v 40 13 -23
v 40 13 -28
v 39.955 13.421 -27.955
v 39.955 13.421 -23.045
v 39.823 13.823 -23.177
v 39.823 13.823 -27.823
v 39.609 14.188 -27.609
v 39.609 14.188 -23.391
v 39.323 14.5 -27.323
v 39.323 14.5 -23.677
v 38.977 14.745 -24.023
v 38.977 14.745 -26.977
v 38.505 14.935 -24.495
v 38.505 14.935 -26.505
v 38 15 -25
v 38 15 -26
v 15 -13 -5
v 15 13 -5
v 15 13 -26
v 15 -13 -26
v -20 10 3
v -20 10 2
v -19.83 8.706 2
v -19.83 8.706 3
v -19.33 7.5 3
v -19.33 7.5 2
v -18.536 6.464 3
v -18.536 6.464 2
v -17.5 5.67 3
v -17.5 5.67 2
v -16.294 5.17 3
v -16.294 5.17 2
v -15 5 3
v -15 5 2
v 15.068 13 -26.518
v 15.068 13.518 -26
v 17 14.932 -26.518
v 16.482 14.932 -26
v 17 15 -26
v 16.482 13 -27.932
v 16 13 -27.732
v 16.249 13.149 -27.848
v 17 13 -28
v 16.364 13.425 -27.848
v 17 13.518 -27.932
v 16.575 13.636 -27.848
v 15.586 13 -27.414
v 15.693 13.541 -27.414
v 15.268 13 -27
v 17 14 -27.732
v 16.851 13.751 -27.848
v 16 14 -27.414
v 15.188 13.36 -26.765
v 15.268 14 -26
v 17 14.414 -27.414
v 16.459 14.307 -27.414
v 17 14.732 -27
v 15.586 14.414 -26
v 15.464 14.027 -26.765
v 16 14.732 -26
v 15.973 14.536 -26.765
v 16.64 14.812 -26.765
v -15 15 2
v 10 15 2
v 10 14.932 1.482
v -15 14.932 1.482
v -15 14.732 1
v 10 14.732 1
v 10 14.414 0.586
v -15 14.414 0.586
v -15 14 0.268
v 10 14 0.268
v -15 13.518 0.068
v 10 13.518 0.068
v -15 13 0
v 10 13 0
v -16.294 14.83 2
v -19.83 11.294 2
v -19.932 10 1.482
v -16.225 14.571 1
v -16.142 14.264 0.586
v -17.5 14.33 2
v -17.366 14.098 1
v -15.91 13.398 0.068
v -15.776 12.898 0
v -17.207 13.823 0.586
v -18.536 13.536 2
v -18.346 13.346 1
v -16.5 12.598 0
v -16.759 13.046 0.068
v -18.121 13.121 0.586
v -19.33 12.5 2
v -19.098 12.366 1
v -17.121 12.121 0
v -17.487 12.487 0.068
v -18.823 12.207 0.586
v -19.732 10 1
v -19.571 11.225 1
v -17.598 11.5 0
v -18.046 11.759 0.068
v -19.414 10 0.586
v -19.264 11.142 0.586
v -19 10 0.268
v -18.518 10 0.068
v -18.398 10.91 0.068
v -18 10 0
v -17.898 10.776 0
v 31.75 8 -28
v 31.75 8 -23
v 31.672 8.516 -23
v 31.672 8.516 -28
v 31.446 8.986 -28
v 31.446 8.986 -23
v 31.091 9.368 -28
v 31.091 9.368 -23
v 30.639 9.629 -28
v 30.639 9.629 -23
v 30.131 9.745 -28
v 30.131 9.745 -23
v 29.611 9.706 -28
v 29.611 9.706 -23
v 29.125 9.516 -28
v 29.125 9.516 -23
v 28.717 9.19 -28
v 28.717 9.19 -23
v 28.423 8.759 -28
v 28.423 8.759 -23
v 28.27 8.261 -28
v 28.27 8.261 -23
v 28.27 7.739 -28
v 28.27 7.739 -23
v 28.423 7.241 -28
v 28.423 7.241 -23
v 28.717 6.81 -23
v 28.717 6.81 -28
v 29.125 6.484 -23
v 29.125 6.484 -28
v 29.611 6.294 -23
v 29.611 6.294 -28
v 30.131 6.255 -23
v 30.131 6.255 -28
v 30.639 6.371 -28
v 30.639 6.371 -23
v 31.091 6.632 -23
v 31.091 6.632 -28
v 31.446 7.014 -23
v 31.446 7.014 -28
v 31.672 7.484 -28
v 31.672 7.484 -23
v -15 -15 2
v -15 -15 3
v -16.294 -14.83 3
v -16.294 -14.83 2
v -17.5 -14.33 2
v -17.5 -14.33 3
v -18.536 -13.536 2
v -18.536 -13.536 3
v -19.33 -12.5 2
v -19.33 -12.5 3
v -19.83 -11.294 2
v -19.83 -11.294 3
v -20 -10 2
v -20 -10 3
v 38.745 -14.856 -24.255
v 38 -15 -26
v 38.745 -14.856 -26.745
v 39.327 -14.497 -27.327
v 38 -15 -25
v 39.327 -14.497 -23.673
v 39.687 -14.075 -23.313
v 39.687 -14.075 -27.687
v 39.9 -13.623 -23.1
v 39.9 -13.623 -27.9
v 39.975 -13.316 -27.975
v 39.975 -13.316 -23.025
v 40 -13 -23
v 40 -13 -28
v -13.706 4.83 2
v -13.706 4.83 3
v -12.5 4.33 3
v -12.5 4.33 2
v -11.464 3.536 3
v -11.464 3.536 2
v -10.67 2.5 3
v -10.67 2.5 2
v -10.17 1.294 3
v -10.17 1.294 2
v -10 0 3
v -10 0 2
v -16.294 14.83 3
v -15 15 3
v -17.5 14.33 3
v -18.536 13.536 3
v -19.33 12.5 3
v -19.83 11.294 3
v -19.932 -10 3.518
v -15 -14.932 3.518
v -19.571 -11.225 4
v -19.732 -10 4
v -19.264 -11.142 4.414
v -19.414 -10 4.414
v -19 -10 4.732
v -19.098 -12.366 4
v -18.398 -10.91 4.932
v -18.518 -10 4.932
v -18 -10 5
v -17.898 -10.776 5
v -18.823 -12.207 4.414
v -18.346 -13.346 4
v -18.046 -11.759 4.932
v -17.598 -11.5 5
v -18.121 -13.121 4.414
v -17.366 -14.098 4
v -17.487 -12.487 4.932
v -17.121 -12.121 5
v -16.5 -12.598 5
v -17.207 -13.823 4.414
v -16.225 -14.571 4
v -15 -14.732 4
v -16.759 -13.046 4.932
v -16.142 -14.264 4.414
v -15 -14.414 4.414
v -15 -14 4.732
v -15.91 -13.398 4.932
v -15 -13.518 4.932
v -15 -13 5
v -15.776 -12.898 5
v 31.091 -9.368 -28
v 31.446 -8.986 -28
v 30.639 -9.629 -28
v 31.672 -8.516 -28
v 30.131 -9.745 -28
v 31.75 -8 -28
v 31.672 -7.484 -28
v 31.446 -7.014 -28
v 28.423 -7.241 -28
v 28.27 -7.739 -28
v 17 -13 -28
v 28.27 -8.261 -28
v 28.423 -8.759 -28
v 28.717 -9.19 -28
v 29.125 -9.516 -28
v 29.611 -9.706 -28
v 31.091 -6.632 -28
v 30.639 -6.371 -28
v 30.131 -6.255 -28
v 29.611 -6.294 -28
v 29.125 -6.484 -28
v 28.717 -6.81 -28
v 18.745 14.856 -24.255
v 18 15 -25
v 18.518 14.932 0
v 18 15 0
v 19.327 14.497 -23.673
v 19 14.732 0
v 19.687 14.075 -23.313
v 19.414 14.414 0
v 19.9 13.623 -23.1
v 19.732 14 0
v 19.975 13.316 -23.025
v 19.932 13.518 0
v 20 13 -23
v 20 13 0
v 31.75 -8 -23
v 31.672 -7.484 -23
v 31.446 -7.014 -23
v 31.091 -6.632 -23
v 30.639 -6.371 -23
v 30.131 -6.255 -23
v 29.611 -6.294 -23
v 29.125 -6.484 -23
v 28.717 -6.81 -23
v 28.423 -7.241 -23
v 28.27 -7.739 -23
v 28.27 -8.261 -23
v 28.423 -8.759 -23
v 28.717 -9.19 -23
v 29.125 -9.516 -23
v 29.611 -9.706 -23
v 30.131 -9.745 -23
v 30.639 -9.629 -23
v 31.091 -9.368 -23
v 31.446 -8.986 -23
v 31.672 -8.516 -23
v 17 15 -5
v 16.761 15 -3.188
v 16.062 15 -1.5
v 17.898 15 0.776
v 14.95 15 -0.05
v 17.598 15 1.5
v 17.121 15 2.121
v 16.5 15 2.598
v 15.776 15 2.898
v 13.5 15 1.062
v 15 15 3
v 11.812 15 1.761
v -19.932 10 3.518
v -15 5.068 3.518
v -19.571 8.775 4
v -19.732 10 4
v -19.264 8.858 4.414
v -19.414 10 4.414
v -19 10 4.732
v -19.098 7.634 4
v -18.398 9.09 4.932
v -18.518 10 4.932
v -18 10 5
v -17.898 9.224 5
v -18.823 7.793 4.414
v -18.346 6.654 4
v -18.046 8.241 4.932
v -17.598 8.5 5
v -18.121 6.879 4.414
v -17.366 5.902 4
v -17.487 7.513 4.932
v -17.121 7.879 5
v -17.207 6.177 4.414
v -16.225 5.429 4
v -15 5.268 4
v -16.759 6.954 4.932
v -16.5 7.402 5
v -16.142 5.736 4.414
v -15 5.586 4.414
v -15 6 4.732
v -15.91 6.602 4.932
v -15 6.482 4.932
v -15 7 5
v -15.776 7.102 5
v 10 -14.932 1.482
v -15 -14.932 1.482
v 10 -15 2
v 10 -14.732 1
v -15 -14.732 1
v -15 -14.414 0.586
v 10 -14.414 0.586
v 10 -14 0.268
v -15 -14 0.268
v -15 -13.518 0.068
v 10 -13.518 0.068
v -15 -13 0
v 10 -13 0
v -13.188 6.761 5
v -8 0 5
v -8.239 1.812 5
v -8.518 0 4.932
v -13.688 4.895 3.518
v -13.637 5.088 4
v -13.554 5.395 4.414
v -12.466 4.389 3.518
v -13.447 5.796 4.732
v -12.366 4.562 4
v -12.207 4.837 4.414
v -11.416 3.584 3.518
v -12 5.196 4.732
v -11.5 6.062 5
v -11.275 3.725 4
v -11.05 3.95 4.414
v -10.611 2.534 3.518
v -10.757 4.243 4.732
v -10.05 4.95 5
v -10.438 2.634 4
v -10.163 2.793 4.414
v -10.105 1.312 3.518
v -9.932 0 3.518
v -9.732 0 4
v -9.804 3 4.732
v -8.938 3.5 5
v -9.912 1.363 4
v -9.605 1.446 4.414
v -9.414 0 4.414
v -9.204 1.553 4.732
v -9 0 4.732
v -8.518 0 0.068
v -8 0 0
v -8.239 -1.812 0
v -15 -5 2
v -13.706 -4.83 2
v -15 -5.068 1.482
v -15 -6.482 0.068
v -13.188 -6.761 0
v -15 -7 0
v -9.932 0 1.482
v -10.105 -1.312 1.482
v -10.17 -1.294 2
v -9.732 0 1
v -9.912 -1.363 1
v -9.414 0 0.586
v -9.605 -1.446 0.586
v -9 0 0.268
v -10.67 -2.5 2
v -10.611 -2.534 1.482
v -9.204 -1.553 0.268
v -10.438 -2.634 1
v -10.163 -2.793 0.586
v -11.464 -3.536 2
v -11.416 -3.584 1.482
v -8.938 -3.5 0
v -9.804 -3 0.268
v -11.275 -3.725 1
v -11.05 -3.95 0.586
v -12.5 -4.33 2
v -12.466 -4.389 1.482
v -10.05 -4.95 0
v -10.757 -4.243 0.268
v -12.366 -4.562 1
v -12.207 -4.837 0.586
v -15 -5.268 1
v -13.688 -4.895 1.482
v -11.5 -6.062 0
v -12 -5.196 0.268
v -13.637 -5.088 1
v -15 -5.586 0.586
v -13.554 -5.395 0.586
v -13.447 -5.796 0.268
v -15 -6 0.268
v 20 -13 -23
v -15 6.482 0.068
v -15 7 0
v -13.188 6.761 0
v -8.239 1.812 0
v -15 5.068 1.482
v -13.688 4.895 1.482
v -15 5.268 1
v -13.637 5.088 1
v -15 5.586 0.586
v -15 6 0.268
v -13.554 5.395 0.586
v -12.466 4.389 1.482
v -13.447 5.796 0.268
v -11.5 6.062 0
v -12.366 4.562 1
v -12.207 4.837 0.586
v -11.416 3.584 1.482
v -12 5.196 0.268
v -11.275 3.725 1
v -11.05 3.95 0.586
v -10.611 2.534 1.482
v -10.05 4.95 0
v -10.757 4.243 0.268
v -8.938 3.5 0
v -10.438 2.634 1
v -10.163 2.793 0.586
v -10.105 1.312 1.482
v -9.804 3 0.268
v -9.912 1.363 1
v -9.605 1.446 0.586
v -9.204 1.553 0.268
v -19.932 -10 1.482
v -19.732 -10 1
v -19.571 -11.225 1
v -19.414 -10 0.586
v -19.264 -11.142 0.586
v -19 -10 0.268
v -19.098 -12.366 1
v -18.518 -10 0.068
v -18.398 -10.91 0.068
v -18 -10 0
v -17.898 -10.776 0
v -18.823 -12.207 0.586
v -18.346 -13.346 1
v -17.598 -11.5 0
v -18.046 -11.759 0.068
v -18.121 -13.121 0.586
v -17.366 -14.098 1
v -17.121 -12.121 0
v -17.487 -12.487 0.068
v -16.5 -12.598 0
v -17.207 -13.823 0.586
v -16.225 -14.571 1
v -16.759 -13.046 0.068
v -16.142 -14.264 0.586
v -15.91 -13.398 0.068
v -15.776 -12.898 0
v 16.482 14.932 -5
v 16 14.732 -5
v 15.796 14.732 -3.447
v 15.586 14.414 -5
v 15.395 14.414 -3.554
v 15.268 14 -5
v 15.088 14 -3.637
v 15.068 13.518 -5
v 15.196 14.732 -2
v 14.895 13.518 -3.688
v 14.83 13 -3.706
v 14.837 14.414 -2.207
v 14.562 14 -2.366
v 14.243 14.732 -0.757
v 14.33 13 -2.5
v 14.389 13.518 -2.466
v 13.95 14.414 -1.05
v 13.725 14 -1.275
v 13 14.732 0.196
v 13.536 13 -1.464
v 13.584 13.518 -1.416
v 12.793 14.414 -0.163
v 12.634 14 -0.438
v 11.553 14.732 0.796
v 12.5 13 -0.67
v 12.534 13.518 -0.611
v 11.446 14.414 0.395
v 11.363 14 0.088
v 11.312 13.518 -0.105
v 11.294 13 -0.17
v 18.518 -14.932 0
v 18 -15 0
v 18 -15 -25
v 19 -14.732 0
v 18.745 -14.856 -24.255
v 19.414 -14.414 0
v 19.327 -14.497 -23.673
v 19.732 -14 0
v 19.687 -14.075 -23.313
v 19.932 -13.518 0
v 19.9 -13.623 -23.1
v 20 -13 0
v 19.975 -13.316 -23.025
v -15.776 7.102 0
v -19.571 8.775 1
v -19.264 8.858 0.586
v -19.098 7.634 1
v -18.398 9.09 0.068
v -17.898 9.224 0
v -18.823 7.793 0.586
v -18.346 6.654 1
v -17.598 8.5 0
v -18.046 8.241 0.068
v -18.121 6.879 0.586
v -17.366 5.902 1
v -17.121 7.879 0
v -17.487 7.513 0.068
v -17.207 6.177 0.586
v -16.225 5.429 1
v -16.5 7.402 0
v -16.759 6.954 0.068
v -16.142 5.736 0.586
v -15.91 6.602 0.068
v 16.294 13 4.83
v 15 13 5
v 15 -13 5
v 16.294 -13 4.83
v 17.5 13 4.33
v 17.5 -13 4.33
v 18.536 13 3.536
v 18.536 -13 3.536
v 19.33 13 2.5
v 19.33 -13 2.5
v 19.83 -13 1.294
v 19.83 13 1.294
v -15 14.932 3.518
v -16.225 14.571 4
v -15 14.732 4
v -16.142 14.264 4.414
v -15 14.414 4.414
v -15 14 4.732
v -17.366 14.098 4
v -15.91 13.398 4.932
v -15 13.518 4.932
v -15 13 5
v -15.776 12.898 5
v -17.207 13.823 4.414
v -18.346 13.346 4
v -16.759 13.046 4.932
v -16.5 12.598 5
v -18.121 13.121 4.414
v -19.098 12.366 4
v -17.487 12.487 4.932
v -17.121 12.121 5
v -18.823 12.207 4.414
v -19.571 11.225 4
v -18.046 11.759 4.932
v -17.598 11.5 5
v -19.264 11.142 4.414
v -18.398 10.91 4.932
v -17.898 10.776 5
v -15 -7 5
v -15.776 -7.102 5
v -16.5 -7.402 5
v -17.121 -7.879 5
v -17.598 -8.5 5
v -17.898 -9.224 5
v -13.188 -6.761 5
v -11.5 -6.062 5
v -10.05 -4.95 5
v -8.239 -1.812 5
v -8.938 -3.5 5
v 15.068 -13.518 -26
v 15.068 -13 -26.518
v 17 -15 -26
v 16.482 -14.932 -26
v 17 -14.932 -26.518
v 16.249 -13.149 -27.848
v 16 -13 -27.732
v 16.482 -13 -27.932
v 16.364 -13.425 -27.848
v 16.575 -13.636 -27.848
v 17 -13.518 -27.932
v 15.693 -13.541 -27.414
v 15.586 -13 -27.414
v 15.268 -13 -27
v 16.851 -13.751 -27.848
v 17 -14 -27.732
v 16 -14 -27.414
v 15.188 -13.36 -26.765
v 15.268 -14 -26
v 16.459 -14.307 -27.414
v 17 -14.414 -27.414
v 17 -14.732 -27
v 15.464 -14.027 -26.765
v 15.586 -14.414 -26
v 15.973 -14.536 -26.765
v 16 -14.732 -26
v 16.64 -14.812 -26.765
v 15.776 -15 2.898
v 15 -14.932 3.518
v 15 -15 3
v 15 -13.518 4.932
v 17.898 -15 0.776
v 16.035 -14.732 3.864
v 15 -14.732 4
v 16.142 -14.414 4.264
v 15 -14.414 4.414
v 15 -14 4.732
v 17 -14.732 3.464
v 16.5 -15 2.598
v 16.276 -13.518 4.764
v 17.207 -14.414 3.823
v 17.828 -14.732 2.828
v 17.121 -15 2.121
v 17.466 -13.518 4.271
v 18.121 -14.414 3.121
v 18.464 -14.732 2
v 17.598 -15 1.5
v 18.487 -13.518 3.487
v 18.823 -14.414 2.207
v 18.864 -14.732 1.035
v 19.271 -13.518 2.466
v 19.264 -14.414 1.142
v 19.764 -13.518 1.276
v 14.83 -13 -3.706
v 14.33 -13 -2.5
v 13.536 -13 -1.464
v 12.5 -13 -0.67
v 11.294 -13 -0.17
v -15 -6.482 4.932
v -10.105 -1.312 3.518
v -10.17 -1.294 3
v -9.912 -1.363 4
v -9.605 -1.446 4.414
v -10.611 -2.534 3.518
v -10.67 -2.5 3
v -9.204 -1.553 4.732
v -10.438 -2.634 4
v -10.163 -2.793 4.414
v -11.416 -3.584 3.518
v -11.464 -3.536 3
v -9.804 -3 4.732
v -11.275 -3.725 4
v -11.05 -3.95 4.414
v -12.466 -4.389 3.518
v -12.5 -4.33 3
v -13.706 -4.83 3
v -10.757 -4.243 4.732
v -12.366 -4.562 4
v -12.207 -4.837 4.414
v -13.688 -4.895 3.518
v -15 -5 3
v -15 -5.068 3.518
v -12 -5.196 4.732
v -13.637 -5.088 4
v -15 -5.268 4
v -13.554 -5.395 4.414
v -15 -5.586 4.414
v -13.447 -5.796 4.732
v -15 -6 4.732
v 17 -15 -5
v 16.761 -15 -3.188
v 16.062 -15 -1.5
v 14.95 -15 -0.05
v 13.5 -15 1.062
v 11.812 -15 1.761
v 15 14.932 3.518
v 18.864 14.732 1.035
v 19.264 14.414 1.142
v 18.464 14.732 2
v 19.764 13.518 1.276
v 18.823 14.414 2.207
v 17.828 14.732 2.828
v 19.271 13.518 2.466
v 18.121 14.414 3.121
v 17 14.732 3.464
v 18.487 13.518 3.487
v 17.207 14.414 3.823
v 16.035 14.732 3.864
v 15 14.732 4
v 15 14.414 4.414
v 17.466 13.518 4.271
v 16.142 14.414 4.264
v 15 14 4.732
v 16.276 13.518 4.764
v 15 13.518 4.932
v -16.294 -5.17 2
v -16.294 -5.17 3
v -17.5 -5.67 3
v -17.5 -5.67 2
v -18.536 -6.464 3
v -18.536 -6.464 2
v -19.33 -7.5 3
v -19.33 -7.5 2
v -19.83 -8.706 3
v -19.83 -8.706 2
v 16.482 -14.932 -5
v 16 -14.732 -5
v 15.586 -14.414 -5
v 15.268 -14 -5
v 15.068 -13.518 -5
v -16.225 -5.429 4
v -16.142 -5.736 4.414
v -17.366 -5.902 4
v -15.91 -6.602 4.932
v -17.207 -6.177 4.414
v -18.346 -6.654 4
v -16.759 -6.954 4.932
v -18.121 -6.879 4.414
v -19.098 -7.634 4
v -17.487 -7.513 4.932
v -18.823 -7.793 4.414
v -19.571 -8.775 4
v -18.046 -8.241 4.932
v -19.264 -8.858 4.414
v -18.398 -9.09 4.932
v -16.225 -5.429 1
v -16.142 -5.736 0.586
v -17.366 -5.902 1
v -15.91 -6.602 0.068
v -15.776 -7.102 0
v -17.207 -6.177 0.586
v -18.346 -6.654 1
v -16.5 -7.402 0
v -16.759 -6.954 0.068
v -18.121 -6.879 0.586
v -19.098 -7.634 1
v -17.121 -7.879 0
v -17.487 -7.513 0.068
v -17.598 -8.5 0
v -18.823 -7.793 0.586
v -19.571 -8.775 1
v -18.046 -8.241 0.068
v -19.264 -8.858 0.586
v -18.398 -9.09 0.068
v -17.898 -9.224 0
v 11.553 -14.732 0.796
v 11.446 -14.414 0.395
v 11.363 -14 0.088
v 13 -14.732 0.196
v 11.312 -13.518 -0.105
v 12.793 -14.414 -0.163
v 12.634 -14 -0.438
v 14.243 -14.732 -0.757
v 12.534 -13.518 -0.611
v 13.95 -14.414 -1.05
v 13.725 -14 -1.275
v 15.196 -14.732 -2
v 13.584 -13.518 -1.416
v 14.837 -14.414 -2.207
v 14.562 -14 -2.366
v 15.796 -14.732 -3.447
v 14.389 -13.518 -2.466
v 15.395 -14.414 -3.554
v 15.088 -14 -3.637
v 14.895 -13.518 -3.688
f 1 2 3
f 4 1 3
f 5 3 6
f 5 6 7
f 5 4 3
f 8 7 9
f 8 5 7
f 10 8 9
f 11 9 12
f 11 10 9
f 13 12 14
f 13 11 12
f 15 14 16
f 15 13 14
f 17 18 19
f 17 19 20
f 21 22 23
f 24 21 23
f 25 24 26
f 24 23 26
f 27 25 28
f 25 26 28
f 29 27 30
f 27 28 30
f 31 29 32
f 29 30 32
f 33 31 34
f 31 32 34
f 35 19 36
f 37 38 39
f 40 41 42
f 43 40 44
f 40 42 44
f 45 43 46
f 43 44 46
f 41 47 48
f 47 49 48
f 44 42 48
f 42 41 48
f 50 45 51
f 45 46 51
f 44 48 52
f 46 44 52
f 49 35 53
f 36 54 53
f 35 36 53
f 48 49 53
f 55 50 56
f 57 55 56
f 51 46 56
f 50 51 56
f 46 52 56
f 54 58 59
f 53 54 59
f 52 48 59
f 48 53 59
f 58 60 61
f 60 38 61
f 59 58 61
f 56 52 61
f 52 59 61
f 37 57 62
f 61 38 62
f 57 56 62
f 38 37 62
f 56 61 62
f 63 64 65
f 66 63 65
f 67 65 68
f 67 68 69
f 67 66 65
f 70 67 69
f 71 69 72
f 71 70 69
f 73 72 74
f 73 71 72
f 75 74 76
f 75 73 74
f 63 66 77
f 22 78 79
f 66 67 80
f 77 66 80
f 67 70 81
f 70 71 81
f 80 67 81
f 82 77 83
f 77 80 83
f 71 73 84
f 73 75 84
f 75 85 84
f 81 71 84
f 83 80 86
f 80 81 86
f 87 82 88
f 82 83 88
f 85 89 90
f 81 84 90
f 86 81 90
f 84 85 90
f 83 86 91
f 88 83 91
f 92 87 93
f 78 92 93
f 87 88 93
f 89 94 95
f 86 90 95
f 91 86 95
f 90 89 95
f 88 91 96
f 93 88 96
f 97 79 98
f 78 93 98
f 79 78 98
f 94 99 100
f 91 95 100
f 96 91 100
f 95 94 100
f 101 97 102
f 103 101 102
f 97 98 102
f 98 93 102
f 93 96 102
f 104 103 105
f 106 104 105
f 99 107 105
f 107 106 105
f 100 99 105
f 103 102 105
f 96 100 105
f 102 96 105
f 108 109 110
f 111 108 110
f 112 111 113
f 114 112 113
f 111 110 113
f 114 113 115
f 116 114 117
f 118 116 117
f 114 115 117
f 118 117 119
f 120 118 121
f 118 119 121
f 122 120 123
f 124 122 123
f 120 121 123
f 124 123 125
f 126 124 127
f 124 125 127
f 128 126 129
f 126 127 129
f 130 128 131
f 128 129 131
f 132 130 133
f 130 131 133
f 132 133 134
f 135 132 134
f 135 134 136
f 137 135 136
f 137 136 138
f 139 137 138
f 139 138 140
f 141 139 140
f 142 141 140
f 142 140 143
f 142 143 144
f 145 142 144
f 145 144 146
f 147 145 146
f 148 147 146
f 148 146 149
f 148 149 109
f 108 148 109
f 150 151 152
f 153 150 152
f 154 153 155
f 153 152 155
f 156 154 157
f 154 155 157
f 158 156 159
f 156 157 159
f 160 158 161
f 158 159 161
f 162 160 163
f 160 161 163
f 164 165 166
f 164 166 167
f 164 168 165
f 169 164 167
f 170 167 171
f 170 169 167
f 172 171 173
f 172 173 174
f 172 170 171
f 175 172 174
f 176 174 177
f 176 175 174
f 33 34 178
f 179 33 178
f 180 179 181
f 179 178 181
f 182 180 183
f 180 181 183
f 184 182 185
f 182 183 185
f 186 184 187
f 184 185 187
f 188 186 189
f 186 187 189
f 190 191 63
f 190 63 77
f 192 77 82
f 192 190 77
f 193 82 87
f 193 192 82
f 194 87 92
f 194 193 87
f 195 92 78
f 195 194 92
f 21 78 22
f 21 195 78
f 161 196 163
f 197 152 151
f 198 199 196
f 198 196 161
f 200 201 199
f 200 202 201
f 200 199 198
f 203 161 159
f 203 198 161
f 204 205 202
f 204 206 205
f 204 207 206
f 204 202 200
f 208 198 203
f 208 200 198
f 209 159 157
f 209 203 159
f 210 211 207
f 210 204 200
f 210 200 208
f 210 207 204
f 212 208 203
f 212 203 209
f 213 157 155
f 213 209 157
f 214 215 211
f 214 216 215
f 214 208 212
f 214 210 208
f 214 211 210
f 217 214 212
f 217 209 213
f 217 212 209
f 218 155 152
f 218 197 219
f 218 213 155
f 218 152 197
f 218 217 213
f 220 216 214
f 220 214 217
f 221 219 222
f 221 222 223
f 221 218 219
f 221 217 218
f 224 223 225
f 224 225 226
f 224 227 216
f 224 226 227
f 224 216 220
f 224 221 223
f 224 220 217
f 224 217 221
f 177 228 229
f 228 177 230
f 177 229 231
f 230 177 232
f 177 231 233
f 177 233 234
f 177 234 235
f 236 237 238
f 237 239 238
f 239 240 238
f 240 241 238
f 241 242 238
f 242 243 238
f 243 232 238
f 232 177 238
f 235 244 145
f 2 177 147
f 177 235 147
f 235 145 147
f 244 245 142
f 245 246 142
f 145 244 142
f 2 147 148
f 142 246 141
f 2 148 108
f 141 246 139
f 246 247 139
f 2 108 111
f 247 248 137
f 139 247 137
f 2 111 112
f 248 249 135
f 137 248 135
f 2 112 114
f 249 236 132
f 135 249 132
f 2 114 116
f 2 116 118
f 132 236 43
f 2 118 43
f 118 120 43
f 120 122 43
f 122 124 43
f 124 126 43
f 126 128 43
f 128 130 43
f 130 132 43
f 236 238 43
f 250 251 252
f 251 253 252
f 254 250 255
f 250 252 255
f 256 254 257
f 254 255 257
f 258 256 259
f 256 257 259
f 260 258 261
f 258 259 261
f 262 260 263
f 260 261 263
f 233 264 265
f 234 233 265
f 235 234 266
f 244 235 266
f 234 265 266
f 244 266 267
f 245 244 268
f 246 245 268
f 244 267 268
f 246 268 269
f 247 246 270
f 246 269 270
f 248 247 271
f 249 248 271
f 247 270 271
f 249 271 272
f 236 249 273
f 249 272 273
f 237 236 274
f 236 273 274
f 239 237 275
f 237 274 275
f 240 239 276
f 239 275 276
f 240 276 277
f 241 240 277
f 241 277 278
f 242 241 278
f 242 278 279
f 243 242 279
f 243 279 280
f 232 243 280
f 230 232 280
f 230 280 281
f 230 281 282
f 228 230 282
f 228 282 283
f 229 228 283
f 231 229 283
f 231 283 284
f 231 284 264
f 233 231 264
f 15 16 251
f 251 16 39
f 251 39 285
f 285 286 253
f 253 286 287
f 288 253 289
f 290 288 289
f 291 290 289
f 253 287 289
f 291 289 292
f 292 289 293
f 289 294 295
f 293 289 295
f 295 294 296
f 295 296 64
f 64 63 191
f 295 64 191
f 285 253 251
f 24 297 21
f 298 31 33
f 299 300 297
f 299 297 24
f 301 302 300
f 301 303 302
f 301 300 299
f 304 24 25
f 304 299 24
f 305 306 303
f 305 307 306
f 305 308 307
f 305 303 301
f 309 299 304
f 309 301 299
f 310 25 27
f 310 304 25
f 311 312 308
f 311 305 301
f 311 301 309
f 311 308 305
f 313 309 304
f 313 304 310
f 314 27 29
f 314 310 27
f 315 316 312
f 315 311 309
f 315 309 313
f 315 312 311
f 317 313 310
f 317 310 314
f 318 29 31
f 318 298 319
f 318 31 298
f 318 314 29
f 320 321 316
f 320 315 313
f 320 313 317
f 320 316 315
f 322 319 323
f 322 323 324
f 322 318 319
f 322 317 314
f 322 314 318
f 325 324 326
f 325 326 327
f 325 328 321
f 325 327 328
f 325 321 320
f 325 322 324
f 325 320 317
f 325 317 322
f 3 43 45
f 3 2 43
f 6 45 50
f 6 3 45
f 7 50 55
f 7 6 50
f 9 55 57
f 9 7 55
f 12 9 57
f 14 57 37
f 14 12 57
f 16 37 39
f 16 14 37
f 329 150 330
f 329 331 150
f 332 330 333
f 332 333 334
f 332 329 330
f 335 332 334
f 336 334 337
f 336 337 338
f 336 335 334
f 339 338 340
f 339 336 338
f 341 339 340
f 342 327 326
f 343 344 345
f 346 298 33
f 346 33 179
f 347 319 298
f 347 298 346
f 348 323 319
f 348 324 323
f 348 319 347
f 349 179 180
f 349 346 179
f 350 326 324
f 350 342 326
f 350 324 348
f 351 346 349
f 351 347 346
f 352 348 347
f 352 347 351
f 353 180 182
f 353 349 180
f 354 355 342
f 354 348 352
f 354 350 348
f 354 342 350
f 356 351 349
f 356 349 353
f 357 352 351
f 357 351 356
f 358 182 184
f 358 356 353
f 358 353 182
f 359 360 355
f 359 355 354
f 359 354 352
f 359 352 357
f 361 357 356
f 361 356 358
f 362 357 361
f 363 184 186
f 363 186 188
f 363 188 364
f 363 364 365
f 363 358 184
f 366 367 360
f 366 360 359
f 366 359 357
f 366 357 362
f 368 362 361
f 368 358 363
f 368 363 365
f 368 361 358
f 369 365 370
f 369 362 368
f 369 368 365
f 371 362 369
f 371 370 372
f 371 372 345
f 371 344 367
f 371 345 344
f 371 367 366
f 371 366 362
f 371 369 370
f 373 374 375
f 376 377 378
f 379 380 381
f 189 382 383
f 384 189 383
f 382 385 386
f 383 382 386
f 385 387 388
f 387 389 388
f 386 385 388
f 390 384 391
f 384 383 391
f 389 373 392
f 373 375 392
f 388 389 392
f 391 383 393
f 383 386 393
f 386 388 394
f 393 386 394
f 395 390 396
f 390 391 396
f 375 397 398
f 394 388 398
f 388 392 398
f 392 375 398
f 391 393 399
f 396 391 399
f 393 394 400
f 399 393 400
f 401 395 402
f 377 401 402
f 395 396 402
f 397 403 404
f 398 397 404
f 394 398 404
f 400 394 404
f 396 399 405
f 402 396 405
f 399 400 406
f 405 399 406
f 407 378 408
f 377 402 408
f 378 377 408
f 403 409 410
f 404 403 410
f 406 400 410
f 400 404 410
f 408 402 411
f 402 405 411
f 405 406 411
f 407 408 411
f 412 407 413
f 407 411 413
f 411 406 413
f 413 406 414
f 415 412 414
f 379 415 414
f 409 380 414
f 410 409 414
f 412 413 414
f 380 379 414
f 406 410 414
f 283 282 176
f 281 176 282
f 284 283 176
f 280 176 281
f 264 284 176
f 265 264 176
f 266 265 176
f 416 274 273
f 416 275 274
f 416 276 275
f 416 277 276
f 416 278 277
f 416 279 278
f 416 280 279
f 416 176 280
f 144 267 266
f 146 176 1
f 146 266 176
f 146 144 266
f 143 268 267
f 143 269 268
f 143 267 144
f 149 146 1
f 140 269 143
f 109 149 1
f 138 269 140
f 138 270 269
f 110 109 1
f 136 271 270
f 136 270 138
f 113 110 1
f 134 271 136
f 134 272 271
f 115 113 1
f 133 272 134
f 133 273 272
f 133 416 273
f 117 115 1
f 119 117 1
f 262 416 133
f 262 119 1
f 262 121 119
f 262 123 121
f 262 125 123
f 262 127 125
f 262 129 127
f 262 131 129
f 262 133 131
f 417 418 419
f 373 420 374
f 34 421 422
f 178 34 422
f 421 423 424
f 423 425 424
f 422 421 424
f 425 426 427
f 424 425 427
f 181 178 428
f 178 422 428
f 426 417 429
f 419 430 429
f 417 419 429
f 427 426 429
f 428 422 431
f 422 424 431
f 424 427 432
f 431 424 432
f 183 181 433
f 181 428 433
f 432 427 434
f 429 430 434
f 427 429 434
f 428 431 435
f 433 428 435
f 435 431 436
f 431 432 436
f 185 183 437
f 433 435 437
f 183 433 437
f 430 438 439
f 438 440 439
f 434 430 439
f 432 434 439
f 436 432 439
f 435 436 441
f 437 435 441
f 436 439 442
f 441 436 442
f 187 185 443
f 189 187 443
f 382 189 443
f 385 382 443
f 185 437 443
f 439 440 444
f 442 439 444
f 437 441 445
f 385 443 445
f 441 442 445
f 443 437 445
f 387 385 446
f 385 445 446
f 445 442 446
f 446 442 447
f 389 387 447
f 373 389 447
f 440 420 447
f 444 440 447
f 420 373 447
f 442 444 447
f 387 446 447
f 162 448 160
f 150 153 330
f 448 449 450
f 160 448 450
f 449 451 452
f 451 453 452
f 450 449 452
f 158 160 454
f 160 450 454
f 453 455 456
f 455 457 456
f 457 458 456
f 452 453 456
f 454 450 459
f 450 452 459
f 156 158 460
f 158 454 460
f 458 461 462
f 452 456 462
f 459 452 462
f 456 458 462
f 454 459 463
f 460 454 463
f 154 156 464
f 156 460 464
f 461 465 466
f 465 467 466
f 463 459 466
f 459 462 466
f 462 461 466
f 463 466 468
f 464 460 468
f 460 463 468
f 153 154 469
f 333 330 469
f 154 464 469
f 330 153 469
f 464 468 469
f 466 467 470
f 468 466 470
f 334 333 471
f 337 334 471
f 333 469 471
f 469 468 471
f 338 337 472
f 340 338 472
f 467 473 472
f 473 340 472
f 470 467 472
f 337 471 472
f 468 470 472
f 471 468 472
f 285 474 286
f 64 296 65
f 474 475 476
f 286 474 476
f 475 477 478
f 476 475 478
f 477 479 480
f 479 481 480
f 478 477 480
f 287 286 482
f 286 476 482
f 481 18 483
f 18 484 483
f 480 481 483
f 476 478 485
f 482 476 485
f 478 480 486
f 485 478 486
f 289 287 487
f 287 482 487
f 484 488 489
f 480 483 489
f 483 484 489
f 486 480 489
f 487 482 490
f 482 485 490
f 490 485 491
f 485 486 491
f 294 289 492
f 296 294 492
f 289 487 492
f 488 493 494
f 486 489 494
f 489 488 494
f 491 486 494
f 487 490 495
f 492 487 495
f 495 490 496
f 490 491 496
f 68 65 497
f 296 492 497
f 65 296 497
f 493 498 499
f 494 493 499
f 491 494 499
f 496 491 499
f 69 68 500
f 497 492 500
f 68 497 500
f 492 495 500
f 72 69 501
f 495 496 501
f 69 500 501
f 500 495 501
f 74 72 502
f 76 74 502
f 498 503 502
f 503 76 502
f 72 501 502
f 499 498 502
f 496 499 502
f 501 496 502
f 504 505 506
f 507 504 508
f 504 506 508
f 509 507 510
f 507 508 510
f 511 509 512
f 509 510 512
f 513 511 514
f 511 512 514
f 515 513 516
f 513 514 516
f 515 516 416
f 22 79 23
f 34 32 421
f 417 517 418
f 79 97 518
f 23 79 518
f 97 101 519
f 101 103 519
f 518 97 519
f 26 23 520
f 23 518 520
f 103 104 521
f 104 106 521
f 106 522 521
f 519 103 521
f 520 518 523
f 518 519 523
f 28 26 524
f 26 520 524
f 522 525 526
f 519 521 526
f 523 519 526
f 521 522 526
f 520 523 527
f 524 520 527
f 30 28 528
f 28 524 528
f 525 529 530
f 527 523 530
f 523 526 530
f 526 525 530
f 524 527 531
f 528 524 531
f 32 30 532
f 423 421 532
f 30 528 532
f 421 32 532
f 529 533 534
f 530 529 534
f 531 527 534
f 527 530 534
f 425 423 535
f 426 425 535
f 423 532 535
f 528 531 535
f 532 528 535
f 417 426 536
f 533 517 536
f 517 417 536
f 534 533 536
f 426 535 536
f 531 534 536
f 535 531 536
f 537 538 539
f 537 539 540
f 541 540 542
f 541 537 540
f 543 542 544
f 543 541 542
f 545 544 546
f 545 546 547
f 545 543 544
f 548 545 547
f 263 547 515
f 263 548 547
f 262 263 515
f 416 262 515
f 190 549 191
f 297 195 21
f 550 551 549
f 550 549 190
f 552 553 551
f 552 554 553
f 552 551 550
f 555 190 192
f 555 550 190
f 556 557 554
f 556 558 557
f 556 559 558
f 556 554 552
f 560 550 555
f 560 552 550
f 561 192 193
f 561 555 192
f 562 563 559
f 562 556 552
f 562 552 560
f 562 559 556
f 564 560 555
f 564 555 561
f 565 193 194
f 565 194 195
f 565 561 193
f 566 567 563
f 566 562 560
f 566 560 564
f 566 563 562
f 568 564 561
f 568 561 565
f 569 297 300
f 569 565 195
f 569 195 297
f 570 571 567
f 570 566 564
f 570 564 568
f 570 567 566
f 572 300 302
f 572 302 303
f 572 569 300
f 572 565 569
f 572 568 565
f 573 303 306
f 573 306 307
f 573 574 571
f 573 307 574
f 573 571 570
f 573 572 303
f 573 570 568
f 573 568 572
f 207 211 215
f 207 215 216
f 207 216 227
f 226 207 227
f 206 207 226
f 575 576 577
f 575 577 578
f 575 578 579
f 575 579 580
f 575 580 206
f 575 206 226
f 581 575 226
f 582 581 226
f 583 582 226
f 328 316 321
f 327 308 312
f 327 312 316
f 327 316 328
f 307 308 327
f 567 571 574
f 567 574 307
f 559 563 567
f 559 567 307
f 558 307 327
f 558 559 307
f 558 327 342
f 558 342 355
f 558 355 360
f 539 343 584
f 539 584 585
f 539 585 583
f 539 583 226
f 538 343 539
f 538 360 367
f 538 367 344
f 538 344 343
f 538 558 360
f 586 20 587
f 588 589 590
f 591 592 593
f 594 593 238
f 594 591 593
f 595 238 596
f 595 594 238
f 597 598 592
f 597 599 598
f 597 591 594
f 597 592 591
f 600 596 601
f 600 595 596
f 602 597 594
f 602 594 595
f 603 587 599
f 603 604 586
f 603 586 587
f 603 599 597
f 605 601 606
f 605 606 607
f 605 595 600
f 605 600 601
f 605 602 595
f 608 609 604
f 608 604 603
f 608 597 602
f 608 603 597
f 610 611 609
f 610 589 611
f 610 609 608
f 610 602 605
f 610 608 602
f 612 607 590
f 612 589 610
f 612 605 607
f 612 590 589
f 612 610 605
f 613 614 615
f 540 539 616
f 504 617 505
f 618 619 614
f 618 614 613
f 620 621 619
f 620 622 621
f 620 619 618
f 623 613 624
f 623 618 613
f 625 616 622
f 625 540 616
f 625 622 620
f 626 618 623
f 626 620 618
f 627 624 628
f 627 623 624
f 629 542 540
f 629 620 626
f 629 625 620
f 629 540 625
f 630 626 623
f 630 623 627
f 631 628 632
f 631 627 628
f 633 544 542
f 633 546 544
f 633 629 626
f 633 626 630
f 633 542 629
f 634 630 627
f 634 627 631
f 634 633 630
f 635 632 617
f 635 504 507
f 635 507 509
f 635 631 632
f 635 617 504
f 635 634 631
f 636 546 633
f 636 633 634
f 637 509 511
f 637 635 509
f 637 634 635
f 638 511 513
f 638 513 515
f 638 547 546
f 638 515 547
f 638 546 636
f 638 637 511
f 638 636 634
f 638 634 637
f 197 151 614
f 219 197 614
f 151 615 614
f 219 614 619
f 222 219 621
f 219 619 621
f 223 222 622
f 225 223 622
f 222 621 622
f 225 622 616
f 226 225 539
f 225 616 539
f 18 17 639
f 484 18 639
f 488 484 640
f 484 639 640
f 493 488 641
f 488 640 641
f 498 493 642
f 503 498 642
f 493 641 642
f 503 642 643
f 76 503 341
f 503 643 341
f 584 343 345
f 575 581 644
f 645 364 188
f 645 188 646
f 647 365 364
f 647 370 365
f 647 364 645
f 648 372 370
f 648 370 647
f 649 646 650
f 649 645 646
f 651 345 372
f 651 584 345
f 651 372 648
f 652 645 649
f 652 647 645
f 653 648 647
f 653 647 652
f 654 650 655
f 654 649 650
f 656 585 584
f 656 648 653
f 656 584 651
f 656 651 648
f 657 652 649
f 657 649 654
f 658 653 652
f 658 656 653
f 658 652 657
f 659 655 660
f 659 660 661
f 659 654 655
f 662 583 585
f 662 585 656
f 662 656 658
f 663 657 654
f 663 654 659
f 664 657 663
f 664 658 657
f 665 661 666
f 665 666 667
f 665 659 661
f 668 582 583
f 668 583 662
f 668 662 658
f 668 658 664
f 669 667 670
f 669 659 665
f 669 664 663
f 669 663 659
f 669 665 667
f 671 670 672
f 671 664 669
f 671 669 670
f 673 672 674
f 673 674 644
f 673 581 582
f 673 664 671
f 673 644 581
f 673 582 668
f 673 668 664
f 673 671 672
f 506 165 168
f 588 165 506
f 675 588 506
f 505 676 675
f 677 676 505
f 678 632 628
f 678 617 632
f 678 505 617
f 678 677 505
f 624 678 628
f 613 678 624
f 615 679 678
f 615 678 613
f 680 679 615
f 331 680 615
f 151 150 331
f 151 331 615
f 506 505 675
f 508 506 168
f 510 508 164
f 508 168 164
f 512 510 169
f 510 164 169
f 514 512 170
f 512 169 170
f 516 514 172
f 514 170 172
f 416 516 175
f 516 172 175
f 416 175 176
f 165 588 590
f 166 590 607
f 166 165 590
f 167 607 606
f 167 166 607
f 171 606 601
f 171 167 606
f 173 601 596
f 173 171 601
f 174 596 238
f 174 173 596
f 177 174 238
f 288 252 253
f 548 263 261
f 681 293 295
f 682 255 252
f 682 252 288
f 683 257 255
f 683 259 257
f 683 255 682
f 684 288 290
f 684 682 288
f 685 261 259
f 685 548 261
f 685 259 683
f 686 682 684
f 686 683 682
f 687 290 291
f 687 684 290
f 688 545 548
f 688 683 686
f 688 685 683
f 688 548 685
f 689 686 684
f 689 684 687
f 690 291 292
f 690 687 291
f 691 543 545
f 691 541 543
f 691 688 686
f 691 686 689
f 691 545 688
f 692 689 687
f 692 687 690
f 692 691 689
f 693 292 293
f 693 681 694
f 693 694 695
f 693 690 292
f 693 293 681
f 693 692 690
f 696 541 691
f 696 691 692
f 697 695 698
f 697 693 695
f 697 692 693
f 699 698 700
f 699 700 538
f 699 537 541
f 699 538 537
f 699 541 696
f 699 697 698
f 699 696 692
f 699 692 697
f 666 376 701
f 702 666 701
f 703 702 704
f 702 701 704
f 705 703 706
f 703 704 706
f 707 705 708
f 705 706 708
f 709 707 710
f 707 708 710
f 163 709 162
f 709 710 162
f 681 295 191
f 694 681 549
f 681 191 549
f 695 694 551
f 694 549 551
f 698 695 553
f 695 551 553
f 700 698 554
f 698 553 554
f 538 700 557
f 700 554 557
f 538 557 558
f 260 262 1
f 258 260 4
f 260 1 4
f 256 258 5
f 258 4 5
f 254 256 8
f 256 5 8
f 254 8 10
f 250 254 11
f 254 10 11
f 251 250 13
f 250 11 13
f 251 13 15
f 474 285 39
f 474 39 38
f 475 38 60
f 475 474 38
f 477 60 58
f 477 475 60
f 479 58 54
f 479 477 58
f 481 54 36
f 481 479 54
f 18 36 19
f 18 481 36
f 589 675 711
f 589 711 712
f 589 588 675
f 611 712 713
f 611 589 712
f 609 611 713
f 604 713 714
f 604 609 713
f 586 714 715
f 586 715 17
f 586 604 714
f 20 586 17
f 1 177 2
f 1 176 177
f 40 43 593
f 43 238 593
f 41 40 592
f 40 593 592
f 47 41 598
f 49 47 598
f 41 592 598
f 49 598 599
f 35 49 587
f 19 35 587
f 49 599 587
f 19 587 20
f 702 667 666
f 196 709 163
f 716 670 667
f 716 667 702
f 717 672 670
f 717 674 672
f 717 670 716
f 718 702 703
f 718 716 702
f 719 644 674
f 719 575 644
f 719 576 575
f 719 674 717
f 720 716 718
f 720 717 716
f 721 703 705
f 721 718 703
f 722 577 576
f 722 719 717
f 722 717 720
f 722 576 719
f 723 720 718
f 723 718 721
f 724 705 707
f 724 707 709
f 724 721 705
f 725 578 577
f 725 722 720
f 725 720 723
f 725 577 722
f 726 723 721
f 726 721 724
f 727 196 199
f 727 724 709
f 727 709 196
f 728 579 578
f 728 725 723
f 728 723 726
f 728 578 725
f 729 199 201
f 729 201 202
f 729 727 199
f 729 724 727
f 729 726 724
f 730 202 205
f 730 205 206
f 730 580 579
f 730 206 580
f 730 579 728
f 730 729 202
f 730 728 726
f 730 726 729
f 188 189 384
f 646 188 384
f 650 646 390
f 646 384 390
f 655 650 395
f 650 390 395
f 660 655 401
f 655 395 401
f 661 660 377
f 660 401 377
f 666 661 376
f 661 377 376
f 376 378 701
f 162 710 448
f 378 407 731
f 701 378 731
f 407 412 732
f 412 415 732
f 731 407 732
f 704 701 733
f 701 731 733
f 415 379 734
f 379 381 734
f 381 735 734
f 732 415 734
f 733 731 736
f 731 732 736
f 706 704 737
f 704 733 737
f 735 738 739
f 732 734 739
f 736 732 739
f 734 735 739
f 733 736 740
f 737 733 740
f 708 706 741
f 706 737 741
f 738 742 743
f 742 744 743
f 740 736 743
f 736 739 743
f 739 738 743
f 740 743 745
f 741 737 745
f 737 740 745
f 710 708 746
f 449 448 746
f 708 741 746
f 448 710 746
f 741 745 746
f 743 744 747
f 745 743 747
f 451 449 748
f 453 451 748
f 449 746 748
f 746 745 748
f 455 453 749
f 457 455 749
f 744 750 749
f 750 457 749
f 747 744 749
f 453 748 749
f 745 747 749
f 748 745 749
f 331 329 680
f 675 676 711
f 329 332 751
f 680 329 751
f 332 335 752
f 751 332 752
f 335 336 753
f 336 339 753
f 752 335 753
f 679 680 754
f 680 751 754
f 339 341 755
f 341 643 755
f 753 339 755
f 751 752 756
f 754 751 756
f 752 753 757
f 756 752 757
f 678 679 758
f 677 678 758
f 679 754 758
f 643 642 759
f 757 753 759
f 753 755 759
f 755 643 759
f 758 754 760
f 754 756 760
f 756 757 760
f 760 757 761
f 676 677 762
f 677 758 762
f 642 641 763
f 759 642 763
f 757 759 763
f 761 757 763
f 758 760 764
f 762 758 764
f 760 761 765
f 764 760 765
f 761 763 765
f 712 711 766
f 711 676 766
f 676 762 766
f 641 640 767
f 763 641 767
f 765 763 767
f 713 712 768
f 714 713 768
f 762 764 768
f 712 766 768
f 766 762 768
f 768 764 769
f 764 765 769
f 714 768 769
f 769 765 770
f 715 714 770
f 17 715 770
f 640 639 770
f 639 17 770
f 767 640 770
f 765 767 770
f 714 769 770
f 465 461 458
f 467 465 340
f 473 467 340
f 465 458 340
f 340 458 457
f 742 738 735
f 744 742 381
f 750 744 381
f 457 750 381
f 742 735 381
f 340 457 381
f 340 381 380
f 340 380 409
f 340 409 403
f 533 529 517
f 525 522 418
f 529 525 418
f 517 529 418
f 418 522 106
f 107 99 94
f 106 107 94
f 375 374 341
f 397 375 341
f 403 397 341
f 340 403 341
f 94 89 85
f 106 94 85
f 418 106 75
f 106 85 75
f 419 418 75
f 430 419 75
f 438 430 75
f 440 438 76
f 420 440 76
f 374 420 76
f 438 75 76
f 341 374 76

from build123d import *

# Parameters (mm, degrees)
F0_W      = 40
F0_H      = 30
F1_DEPTH  = 5
F2_W      = 10
F2_H      = 10
F3_DEPTH  = 25
F4_W      = 5
F4_H      = 30
F5_DEPTH  = 28
F6_W      = 30
F6_H      = 5
F7_DEPTH  = 20
F8_R      = 4.99999
F9_R      = 2
F10_R     = 1.75
F11_DEPTH = 25


# Not quite as in the source:
# - a fillet or chamfer is up to 0.001 mm smaller than in the source, because OpenCascade refuses the exact size


with BuildPart() as f1:
    # F0 (on Top) → F1 (new body)
    with BuildSketch(Plane.XY):
        Rectangle(F0_W, F0_H)
    extrude(amount=F1_DEPTH)

    # F2 (on face) → F3 (cut)
    with BuildSketch(Plane.XY.offset(5)):
        with Locations((-15, 0)):
            Rectangle(F2_W, F2_H)
    extrude(amount=-F3_DEPTH, mode=Mode.SUBTRACT)

    # F4 (on face) → F5 (join)
    with BuildSketch(Plane(origin=(0, 0, 0), x_dir=(1, 0, 0), z_dir=(0, 0, -1))):
        with Locations((17.5, 0)):
            Rectangle(F4_W, F4_H)
    extrude(amount=F5_DEPTH)

    # F6 (on face) → F7 (join)
    with BuildSketch(Plane.YZ.offset(20)):
        with Locations((0, -25.5)):
            Rectangle(F6_W, F6_H)
    extrude(amount=F7_DEPTH)

    # F8 (radius 5 in the source; OpenCascade refuses exactly that, so slightly less here)
    f8_edges = [f1.edges().sort_by_distance(p)[0] for p in [
        (-20, 5, 2.5),
        (-20, -5, 2.5),
        (-20, -15, 2.5),
        (-20, 15, 2.5),
        (20, 0, 5),
        (-10, -5, 2.5),
        (-10, 5, 2.5),
        (15, 0, 0),
    ]]
    fillet(f8_edges, radius=F8_R)

    # F9
    f9_edges = [f1.edges().sort_by_distance(p)[0] for p in [
        (0, -15, 5),
        (-18.535537, -13.535537, 5),
        (15.00001, 0, 5),
        (-20, -10, 5),
        (0, 15, 5),
        (-18.535537, -6.464463, 5),
        (-18.535537, 13.535537, 5),
        (-15, -5, 5),
        (-20, 10, 5),
        (-11.464463, -3.535537, 5),
        (-18.535537, 6.464463, 5),
        (-10, 0, 5),
        (-15, 5, 5),
        (-11.464463, 3.535537, 5),
        (15, -15, -16.499995),
        (15, 0, -28),
        (-15.00001, -15, 2.5),
        (18.535537, -15, 3.535537),
        (-2.5, -15, 0),
        (20, -15, -11.499995),
        (13.535537, -15, -1.464463),
        (30, -15, -23),
        (40, -15, -25.5),
        (27.5, -15, -28),
        (20, 15, -11.499995),
        (18.535537, 15, 3.535537),
        (30, 15, -23),
        (40, 15, -25.5),
        (-15.00001, 15, 2.5),
        (27.5, 15, -28),
        (-2.5, 15, 0),
        (15, 15, -16.499995),
        (13.535537, 15, -1.464463),
    ]]
    fillet(f9_edges, radius=F9_R)

    # F10 (on face) → F11 (cut)
    with BuildSketch(Plane.XY.offset(-23)):
        with Locations((30, -8)):
            Circle(F10_R)
        with Locations((30, 8)):
            Circle(F10_R)
    extrude(amount=-F11_DEPTH, mode=Mode.SUBTRACT)


solid = f1.part
